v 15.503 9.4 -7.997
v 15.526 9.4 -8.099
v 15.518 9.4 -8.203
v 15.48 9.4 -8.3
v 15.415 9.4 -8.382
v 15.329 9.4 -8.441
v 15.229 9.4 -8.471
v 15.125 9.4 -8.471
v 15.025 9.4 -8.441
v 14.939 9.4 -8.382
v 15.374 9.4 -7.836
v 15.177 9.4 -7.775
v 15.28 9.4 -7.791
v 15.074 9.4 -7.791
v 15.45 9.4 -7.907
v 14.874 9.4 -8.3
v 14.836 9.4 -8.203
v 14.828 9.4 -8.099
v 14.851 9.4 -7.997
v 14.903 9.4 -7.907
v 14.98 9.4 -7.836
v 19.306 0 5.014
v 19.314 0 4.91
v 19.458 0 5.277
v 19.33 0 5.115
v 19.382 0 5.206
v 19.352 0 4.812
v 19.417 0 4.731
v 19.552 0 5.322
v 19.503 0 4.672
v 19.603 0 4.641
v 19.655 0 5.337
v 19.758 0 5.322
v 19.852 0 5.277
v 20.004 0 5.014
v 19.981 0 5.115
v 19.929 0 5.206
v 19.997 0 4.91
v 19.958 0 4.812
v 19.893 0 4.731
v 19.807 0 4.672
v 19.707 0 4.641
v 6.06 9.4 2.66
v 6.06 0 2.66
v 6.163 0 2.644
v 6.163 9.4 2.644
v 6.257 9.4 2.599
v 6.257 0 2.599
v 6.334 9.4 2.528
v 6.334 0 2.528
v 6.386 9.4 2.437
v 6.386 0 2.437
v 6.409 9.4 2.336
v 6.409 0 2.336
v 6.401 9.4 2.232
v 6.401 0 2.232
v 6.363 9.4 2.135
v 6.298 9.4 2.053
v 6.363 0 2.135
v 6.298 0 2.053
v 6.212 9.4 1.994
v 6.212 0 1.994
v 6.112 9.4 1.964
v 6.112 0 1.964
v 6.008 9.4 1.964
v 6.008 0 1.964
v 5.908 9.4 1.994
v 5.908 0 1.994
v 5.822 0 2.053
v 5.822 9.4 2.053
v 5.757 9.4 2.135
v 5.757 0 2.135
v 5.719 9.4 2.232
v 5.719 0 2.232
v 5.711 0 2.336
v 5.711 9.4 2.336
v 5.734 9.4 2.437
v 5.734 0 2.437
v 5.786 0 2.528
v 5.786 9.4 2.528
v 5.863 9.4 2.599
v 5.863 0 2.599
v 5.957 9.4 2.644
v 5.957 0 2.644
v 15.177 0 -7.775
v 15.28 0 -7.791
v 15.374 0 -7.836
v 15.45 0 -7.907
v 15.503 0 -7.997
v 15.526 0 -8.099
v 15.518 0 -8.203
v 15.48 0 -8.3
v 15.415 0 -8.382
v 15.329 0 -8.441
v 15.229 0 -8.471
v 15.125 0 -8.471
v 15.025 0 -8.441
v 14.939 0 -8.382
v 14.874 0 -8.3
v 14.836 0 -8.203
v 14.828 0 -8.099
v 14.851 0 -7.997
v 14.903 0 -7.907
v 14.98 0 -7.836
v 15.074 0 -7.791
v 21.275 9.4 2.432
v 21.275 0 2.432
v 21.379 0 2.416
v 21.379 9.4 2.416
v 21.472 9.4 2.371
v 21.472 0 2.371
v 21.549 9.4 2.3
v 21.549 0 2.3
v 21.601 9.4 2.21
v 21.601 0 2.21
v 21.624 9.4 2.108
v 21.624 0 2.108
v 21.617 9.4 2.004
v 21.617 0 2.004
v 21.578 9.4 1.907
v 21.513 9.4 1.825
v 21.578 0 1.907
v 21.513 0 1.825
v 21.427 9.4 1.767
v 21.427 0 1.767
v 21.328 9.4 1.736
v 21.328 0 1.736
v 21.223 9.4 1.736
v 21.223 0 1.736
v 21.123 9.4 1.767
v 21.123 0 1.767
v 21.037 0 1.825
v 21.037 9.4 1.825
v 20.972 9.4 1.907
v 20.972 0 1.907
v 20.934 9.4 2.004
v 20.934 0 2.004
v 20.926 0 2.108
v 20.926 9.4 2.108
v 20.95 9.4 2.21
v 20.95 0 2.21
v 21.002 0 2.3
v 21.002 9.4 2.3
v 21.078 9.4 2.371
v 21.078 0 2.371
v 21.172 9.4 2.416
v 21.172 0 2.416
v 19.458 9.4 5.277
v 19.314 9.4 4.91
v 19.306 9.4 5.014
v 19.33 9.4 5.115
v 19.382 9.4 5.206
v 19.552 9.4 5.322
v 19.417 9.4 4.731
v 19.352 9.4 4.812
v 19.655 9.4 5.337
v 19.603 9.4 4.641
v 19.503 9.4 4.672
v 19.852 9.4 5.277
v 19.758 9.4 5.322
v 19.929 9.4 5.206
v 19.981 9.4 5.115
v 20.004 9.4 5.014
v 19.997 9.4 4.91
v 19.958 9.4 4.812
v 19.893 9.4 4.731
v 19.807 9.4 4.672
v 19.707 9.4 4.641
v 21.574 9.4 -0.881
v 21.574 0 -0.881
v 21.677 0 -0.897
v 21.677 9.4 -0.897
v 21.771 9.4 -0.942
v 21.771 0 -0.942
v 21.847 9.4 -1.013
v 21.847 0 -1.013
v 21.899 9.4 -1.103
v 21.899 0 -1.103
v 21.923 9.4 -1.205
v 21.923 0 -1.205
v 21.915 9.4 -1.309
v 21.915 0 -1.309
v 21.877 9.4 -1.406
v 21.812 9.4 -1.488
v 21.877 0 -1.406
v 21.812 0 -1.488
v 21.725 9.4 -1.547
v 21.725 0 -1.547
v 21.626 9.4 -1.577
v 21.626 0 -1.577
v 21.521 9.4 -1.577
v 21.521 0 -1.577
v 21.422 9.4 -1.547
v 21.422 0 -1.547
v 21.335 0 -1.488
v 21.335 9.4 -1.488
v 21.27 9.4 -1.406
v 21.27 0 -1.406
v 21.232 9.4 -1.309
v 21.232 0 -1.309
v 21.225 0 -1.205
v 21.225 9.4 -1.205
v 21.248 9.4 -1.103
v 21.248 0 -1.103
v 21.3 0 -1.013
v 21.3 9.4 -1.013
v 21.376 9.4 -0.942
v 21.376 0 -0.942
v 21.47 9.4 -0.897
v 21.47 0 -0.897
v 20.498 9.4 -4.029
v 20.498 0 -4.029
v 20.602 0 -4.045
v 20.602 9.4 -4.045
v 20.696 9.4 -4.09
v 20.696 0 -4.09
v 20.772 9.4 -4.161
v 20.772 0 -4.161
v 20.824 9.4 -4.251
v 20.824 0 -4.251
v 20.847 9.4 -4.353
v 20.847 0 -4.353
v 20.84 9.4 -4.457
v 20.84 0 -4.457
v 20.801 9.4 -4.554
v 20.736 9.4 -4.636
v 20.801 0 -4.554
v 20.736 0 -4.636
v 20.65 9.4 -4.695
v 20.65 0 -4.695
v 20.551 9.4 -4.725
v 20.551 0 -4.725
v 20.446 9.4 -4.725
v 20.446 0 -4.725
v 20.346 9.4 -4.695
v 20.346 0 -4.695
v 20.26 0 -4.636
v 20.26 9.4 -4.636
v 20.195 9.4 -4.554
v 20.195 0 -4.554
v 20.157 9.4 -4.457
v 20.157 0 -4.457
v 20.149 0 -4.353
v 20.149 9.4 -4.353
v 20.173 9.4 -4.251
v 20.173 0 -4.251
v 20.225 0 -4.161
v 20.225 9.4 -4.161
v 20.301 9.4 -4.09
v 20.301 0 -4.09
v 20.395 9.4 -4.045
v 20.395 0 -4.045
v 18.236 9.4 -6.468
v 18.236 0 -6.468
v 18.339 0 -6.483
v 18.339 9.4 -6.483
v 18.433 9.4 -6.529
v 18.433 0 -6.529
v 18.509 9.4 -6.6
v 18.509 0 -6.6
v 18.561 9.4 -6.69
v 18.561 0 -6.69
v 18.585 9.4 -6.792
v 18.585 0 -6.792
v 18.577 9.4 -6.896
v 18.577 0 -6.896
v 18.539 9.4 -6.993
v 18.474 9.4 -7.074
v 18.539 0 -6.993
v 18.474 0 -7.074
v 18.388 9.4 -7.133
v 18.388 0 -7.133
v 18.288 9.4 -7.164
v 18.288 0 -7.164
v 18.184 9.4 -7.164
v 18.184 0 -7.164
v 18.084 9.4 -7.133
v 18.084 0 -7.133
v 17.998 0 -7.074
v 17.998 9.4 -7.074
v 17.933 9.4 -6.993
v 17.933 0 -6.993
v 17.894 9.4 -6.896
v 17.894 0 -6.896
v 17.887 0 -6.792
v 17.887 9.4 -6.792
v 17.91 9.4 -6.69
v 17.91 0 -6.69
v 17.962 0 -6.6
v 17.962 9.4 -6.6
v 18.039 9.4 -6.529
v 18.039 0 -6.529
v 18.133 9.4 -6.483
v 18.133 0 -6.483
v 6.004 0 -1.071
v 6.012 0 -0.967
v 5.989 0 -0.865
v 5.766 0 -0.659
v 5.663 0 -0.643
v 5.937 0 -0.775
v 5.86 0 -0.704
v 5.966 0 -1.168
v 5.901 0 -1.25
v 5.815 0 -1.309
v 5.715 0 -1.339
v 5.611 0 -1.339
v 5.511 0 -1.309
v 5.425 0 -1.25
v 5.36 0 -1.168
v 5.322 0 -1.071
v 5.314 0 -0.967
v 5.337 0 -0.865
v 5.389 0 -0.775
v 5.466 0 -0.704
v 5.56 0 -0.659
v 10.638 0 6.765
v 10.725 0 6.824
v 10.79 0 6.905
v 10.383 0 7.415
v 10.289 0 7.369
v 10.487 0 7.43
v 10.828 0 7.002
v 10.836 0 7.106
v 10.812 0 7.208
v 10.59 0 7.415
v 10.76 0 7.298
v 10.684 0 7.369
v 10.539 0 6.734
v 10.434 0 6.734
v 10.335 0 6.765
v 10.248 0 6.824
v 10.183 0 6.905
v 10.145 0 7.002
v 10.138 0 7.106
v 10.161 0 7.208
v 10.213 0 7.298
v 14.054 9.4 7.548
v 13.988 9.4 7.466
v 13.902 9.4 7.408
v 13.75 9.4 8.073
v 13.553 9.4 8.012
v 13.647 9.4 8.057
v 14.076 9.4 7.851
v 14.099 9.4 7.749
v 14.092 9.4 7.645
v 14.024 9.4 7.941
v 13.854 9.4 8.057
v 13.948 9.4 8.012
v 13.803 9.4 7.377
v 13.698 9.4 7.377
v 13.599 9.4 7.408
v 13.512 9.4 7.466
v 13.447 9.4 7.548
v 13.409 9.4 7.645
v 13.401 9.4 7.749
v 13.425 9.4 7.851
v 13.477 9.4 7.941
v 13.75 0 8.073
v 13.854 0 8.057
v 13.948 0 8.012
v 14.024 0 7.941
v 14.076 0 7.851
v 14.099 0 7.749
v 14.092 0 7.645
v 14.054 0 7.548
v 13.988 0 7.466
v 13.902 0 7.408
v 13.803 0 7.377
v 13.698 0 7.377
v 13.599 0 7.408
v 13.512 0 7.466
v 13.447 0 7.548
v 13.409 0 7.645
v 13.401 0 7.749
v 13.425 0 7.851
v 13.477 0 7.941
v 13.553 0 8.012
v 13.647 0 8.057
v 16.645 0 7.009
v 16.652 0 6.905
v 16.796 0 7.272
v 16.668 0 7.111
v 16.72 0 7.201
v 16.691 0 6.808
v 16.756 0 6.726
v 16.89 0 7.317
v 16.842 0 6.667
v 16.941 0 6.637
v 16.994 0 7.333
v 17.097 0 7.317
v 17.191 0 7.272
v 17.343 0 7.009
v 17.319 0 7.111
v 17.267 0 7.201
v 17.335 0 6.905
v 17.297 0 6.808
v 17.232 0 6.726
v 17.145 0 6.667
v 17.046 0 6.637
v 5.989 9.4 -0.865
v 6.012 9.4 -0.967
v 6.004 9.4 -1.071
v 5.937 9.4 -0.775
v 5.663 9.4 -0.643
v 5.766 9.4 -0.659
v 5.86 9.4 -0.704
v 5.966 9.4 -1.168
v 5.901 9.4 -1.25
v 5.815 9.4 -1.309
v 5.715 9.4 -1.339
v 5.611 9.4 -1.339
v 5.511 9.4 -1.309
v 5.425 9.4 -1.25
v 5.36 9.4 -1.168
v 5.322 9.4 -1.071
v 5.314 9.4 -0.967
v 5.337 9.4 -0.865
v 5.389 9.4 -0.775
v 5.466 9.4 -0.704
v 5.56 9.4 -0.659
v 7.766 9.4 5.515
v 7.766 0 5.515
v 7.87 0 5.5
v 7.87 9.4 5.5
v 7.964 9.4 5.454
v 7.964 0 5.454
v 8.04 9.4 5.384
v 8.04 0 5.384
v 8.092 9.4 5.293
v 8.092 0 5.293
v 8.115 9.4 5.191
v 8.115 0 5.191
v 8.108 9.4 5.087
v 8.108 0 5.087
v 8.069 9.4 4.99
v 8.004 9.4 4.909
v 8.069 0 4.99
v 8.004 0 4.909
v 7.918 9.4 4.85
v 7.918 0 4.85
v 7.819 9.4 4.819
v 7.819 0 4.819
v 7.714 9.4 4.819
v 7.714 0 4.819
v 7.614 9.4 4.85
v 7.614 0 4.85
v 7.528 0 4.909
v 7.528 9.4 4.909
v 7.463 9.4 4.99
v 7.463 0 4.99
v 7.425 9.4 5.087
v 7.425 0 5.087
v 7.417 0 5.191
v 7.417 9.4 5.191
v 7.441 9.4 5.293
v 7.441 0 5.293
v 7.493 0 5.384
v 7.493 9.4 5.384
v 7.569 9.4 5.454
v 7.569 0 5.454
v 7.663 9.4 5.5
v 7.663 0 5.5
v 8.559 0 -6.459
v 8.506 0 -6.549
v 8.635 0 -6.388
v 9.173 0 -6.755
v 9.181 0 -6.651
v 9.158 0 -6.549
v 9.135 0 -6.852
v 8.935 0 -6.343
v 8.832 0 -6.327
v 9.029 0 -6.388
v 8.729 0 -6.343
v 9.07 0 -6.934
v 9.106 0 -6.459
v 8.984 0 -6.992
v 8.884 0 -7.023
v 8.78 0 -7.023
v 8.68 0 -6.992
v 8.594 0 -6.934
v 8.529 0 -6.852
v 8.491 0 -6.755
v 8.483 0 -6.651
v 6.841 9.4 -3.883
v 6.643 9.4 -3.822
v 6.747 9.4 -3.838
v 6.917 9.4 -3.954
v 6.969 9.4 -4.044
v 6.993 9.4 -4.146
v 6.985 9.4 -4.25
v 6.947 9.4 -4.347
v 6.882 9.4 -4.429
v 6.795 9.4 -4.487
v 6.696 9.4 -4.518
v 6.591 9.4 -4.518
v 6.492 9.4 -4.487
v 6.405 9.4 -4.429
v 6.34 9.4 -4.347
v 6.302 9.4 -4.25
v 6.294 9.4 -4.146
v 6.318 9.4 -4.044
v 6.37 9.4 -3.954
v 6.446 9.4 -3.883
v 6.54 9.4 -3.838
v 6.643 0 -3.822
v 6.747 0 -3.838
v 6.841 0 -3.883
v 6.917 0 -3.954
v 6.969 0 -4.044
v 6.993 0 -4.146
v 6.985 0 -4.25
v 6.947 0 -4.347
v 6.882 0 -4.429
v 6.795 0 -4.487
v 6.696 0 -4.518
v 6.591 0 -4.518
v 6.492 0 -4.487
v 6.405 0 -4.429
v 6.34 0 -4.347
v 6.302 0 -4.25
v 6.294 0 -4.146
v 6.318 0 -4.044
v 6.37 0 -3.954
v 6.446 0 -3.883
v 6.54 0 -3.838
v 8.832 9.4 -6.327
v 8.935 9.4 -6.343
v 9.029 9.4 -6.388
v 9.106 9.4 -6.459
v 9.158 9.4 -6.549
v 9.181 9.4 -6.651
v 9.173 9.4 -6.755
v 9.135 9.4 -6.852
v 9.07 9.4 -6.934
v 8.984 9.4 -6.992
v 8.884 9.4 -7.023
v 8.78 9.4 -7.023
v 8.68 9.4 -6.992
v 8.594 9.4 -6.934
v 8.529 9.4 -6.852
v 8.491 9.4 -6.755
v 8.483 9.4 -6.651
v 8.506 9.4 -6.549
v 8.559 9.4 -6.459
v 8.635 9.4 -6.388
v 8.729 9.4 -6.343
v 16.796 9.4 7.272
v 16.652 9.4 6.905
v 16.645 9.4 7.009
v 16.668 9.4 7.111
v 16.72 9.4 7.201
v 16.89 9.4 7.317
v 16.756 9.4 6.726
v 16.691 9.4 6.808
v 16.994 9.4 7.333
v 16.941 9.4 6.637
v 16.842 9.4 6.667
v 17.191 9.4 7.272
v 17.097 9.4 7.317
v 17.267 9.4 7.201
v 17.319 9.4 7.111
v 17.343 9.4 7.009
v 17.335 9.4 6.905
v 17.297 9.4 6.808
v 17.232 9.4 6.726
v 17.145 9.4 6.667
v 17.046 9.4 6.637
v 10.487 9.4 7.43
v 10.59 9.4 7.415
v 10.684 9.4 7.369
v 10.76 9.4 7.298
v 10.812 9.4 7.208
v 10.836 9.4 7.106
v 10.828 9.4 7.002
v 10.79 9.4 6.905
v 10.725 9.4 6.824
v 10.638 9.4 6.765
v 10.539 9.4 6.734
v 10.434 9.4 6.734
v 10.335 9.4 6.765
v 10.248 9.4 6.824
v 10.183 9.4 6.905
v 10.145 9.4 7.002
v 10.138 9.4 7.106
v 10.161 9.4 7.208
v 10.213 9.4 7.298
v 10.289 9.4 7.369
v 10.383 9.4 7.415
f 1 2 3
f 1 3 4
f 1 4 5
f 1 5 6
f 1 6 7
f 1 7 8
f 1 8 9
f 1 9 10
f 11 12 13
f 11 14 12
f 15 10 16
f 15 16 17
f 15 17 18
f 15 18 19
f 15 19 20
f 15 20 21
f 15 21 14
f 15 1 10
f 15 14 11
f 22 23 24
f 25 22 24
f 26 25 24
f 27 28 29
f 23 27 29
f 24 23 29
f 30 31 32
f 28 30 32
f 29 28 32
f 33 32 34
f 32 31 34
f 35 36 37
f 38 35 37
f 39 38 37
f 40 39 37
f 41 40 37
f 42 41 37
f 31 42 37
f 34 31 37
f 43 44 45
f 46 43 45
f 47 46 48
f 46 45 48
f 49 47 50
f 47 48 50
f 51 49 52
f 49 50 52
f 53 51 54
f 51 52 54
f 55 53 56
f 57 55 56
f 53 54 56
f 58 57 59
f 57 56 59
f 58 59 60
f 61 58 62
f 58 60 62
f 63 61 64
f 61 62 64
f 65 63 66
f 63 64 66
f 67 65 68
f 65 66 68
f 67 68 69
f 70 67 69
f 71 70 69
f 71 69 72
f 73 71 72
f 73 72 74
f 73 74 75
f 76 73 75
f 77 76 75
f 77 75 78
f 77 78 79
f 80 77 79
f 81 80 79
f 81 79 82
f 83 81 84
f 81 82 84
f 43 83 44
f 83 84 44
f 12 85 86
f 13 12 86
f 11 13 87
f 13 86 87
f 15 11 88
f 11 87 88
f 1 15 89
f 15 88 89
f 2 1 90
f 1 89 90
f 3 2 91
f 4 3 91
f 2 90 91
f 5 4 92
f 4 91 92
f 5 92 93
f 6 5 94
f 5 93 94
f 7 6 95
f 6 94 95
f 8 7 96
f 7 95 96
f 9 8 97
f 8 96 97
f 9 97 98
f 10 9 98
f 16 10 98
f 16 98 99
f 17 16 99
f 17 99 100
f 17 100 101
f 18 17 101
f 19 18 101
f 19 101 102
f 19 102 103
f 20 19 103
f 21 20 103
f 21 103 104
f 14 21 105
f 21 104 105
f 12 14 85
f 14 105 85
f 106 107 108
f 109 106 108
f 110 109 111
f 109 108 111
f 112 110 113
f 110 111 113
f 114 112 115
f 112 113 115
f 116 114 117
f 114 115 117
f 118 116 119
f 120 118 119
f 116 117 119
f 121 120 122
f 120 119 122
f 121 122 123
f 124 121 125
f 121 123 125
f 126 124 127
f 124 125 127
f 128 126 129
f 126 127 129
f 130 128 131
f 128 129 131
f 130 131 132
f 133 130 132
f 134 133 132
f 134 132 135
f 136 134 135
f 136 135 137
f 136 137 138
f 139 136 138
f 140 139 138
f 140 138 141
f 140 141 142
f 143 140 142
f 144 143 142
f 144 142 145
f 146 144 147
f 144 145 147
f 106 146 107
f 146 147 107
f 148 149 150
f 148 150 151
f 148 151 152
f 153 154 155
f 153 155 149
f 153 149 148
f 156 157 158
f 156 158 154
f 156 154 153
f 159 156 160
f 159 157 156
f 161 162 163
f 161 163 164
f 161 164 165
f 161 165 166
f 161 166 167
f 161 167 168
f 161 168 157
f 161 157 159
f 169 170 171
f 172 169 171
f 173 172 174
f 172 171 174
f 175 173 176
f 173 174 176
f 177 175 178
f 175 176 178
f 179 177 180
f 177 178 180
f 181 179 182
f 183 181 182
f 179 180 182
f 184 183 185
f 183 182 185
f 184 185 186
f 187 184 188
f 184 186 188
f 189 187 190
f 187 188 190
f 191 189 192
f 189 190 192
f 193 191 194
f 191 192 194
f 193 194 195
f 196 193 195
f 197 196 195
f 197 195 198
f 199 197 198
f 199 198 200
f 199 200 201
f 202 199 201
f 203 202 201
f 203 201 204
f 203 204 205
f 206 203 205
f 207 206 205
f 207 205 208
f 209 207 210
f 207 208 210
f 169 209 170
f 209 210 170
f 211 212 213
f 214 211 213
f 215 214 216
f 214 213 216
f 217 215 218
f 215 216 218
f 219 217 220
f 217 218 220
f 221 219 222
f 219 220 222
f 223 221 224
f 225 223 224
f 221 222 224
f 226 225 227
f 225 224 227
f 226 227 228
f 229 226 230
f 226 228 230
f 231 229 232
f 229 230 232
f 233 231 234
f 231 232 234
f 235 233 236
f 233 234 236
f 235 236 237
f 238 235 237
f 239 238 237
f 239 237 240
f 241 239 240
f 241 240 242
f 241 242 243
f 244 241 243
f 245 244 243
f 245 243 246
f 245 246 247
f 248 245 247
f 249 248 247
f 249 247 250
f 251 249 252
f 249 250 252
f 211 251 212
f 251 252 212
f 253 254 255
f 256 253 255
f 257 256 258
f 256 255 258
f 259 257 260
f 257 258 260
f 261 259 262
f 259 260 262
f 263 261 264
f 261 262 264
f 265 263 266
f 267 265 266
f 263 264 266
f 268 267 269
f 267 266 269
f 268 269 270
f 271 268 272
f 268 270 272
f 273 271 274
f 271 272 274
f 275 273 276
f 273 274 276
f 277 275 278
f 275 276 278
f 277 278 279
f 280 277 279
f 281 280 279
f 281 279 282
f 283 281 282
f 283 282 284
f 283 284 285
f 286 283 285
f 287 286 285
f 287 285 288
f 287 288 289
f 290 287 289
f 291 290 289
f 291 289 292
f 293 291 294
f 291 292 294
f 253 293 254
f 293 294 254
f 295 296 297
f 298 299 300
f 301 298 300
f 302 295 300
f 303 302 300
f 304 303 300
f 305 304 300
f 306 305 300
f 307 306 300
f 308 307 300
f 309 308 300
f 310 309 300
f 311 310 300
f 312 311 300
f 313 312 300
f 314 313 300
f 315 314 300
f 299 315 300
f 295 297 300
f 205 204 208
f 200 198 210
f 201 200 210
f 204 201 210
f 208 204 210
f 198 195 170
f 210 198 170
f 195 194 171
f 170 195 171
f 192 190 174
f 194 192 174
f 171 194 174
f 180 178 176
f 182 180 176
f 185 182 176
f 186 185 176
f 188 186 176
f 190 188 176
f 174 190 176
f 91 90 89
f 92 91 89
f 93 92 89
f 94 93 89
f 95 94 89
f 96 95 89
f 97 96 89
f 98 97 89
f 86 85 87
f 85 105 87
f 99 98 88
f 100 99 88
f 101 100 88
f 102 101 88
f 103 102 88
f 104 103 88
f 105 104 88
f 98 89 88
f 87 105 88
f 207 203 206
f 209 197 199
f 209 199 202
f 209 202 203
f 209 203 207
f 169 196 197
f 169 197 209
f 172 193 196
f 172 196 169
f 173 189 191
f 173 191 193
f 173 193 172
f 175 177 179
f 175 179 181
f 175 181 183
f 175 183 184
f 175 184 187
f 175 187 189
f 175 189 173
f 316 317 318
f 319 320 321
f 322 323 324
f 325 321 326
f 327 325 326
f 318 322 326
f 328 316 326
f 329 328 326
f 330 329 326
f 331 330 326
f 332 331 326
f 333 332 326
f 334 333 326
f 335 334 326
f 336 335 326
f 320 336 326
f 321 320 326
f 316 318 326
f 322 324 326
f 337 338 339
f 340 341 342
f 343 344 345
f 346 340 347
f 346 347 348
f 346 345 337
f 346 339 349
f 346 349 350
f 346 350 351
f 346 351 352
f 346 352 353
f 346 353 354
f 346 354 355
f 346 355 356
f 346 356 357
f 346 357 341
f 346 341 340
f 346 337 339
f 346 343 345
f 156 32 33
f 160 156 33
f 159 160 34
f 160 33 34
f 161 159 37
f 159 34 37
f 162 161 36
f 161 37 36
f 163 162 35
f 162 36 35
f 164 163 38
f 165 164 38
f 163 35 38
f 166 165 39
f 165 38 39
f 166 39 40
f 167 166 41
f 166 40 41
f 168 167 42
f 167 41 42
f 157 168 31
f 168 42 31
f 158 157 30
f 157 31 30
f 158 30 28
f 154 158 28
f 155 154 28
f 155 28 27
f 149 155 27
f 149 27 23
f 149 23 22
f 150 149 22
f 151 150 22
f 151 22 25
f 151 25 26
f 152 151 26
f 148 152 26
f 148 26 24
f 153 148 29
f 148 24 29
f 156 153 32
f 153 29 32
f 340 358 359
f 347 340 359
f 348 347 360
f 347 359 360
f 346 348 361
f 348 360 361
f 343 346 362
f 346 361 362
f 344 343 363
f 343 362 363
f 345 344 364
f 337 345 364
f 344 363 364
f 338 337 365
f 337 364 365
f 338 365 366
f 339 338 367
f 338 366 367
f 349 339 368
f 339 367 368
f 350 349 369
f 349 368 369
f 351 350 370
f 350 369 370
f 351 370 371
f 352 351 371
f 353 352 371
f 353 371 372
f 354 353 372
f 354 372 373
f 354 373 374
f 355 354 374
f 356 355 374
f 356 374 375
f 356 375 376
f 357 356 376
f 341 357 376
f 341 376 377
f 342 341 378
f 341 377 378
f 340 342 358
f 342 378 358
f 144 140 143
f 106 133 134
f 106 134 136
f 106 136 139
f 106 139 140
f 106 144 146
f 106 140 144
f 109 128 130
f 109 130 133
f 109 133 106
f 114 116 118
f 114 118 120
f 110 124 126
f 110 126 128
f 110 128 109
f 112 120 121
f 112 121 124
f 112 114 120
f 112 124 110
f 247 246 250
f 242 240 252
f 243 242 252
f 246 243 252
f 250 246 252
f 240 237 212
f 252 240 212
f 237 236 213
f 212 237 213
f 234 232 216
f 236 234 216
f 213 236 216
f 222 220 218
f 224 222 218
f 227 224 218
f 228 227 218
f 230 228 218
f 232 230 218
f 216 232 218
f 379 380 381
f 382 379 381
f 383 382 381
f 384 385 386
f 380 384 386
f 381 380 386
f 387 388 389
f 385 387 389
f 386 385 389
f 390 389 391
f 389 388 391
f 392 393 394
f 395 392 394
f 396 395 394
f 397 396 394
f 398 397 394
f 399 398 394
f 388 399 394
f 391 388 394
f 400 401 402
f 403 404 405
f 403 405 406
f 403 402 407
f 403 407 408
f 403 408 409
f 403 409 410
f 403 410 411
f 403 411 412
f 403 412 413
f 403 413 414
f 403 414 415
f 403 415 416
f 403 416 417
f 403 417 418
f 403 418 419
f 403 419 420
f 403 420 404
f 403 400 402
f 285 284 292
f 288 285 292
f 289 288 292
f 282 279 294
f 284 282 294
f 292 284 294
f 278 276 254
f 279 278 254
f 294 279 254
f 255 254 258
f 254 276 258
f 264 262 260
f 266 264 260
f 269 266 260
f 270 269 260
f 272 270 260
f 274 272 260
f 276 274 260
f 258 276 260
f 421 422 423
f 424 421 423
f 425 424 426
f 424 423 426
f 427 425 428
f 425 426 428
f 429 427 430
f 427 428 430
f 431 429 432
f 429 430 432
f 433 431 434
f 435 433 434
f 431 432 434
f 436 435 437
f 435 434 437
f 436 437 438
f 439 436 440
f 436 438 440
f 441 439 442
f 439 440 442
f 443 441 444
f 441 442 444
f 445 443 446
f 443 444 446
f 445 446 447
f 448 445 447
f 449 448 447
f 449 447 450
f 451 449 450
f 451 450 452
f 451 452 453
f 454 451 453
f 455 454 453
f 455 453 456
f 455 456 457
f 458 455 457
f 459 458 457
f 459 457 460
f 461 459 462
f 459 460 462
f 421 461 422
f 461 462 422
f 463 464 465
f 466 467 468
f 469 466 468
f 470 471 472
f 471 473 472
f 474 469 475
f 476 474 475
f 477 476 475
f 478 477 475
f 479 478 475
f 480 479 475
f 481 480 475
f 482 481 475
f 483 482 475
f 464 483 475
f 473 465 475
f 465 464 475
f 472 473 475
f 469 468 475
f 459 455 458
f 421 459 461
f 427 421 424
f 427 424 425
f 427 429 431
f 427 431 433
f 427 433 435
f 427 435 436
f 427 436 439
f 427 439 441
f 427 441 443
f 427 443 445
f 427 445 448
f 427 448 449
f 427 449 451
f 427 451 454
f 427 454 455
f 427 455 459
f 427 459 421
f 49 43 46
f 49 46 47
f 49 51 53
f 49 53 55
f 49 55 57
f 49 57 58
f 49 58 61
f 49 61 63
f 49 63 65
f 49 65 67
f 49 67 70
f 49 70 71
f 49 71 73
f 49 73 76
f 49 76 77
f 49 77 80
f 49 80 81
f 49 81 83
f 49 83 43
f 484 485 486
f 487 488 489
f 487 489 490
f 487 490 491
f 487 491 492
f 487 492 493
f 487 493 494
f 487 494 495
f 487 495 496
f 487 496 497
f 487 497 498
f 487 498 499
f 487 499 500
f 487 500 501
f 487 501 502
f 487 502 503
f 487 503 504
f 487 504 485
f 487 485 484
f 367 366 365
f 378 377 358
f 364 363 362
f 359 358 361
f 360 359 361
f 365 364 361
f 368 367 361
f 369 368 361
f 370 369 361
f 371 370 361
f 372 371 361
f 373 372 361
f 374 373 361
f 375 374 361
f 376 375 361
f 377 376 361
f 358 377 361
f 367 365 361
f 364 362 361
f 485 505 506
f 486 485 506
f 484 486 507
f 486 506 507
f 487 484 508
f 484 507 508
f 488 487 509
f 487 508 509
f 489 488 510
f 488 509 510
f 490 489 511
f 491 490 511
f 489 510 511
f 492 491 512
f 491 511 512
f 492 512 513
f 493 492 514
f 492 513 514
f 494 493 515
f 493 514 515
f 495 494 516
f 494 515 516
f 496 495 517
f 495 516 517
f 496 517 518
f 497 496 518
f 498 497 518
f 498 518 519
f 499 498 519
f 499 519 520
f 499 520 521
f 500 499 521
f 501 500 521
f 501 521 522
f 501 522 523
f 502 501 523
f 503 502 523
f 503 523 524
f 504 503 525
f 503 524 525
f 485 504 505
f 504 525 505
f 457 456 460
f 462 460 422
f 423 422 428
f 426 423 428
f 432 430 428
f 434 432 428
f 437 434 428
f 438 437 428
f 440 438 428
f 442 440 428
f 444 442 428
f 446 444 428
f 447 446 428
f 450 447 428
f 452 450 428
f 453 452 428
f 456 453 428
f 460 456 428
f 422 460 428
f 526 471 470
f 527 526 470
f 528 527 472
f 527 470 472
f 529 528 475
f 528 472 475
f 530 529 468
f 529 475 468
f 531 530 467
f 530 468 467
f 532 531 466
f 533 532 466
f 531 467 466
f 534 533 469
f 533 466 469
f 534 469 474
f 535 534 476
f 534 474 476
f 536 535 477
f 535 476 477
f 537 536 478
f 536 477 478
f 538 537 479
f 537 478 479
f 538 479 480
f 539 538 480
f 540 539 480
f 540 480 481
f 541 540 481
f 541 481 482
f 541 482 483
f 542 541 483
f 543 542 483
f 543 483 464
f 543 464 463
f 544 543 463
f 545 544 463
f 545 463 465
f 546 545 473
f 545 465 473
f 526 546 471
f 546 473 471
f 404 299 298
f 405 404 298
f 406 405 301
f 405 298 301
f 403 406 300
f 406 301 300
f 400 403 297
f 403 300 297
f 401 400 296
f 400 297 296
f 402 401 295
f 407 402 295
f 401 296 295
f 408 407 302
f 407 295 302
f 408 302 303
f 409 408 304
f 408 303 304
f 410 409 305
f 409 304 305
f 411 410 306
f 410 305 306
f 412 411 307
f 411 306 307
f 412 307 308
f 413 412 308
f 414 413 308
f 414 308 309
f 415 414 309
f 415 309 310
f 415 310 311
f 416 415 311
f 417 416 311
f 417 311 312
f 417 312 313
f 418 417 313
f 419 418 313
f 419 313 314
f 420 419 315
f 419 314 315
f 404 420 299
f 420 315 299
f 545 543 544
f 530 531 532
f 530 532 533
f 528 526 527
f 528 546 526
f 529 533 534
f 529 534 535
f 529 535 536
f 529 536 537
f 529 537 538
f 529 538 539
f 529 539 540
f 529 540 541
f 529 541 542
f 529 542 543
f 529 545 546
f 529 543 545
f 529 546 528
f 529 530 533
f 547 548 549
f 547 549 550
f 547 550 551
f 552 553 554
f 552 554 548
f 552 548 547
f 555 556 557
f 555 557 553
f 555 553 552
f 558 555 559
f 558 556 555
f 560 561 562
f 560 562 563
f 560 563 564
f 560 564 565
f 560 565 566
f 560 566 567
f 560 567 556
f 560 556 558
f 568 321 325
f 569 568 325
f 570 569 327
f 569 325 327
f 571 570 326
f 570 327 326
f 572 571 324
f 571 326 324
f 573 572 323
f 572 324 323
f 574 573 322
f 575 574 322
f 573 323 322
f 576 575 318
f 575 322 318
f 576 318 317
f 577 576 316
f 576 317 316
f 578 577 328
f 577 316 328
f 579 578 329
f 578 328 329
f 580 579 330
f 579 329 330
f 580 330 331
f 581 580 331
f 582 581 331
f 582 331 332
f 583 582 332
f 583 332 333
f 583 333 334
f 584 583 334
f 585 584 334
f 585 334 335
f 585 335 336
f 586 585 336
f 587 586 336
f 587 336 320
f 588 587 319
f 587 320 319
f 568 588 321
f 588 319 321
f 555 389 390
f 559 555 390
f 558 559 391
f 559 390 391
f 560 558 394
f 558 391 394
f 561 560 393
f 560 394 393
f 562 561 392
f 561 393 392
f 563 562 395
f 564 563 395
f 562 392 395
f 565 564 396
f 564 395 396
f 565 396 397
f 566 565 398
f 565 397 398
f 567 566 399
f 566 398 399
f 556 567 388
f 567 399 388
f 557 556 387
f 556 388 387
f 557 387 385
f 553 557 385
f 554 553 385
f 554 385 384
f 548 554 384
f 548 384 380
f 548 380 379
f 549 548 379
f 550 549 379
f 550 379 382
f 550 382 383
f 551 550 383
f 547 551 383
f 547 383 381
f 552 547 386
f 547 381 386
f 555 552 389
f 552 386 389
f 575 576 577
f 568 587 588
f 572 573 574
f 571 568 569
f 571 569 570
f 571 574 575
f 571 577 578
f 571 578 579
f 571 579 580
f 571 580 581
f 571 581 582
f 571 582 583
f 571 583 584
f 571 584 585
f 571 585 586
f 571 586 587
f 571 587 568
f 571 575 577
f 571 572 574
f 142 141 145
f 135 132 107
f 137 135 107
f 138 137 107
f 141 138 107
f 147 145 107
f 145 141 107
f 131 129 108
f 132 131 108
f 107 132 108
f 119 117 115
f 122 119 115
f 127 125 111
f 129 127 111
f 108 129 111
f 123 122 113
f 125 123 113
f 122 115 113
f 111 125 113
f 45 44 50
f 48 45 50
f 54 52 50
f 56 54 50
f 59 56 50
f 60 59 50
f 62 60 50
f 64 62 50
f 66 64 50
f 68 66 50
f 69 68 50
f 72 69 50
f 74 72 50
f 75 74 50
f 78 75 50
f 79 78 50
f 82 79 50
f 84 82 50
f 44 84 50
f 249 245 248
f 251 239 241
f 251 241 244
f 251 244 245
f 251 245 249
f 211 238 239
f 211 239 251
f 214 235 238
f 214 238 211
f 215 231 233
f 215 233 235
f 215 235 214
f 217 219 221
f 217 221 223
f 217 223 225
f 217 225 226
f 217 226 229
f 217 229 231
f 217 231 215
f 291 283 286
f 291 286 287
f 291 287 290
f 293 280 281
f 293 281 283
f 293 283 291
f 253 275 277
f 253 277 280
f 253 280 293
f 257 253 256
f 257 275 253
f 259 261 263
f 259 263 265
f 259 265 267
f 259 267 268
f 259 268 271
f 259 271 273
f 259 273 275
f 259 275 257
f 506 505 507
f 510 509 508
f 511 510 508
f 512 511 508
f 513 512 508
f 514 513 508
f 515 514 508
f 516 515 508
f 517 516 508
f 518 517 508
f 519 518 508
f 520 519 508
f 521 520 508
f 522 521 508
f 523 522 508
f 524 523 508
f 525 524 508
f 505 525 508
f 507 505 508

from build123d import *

# Parameters (mm, degrees)
SKETCH1_R              = 0.35
BOSS_EXTRUDE1_DEPTH    = 9.4
BOSS_EXTRUDE1_2_DEPTH  = 9.4
BOSS_EXTRUDE1_3_DEPTH  = 9.4
BOSS_EXTRUDE1_4_DEPTH  = 9.4
BOSS_EXTRUDE1_5_DEPTH  = 9.4
BOSS_EXTRUDE1_6_DEPTH  = 9.4
BOSS_EXTRUDE1_7_DEPTH  = 9.4
BOSS_EXTRUDE1_8_DEPTH  = 9.4
BOSS_EXTRUDE1_9_DEPTH  = 9.4
BOSS_EXTRUDE1_10_DEPTH = 9.4
BOSS_EXTRUDE1_11_DEPTH = 9.4
BOSS_EXTRUDE1_12_DEPTH = 9.4
BOSS_EXTRUDE1_13_DEPTH = 9.4
BOSS_EXTRUDE1_14_DEPTH = 9.4


with BuildPart() as part:
    # Sketch1 → Boss-Extrude1 (new body)
    with BuildSketch(Plane(origin=(0, 0, 0), x_dir=(1, 0, 0), z_dir=(0, 1, 0))):
        with Locations(Location((15.176802475, 8.12525881, 0), (0, 0, 270))):
            Circle(SKETCH1_R)
    extrude(amount=BOSS_EXTRUDE1_DEPTH)


with BuildPart() as body_2:
    # Sketch1 → Boss-Extrude1 2 (new body)
    with BuildSketch(Plane(origin=(0, 0, 0), x_dir=(1, 0, 0), z_dir=(0, 1, 0))):
        with Locations(Location((18.235691658, 6.817826829, 0), (0, 0, 270))):
            Circle(SKETCH1_R)
    extrude(amount=BOSS_EXTRUDE1_2_DEPTH)


with BuildPart() as body_3:
    # Sketch1 → Boss-Extrude1 3 (new body)
    with BuildSketch(Plane(origin=(0, 0, 0), x_dir=(1, 0, 0), z_dir=(0, 1, 0))):
        with Locations(Location((20.498345482, 4.379265963, 0), (0, 0, 270))):
            Circle(SKETCH1_R)
    extrude(amount=BOSS_EXTRUDE1_3_DEPTH)


with BuildPart() as body_4:
    # Sketch1 → Boss-Extrude1 4 (new body)
    with BuildSketch(Plane(origin=(0, 0, 0), x_dir=(1, 0, 0), z_dir=(0, 1, 0))):
        with Locations(Location((21.573530543, 1.23122554, 0), (0, 0, 270))):
            Circle(SKETCH1_R)
    extrude(amount=BOSS_EXTRUDE1_4_DEPTH)


with BuildPart() as body_5:
    # Sketch1 → Boss-Extrude1 5 (new body)
    with BuildSketch(Plane(origin=(0, 0, 0), x_dir=(1, 0, 0), z_dir=(0, 1, 0))):
        with Locations(Location((21.275337579, -2.081969652, 0), (0, 0, 270))):
            Circle(SKETCH1_R)
    extrude(amount=BOSS_EXTRUDE1_5_DEPTH)


with BuildPart() as body_6:
    # Sketch1 → Boss-Extrude1 6 (new body)
    with BuildSketch(Plane(origin=(0, 0, 0), x_dir=(1, 0, 0), z_dir=(0, 1, 0))):
        with Locations(Location((19.655326861, -4.987438064, 0), (0, 0, 270))):
            Circle(SKETCH1_R)
    extrude(amount=BOSS_EXTRUDE1_6_DEPTH)


with BuildPart() as body_7:
    # Sketch1 → Boss-Extrude1 7 (new body)
    with BuildSketch(Plane(origin=(0, 0, 0), x_dir=(1, 0, 0), z_dir=(0, 1, 0))):
        with Locations(Location((16.993612959, -6.982797813, 0), (0, 0, 270))):
            Circle(SKETCH1_R)
    extrude(amount=BOSS_EXTRUDE1_7_DEPTH)


with BuildPart() as body_8:
    # Sketch1 → Boss-Extrude1 8 (new body)
    with BuildSketch(Plane(origin=(0, 0, 0), x_dir=(1, 0, 0), z_dir=(0, 1, 0))):
        with Locations(Location((13.750430389, -7.723033071, 0), (0, 0, 270))):
            Circle(SKETCH1_R)
    extrude(amount=BOSS_EXTRUDE1_8_DEPTH)


with BuildPart() as body_9:
    # Sketch1 → Boss-Extrude1 9 (new body)
    with BuildSketch(Plane(origin=(0, 0, 0), x_dir=(1, 0, 0), z_dir=(0, 1, 0))):
        with Locations(Location((10.48655488, -7.080150437, 0), (0, 0, 270))):
            Circle(SKETCH1_R)
    extrude(amount=BOSS_EXTRUDE1_9_DEPTH)


with BuildPart() as body_10:
    # Sketch1 → Boss-Extrude1 10 (new body)
    with BuildSketch(Plane(origin=(0, 0, 0), x_dir=(1, 0, 0), z_dir=(0, 1, 0))):
        with Locations(Location((7.766340158, -5.165310159, 0), (0, 0, 270))):
            Circle(SKETCH1_R)
    extrude(amount=BOSS_EXTRUDE1_10_DEPTH)


with BuildPart() as body_11:
    # Sketch1 → Boss-Extrude1 11 (new body)
    with BuildSketch(Plane(origin=(0, 0, 0), x_dir=(1, 0, 0), z_dir=(0, 1, 0))):
        with Locations(Location((6.060136062, -2.309605516, 0), (0, 0, 270))):
            Circle(SKETCH1_R)
    extrude(amount=BOSS_EXTRUDE1_11_DEPTH)


with BuildPart() as body_12:
    # Sketch1 → Boss-Extrude1 12 (new body)
    with BuildSketch(Plane(origin=(0, 0, 0), x_dir=(1, 0, 0), z_dir=(0, 1, 0))):
        with Locations(Location((5.662960781, 0.993186215, 0), (0, 0, 270))):
            Circle(SKETCH1_R)
    extrude(amount=BOSS_EXTRUDE1_12_DEPTH)


with BuildPart() as body_13:
    # Sketch1 → Boss-Extrude1 13 (new body)
    with BuildSketch(Plane(origin=(0, 0, 0), x_dir=(1, 0, 0), z_dir=(0, 1, 0))):
        with Locations(Location((6.643489528, 4.171982339, 0), (0, 0, 270))):
            Circle(SKETCH1_R)
    extrude(amount=BOSS_EXTRUDE1_13_DEPTH)


with BuildPart() as body_14:
    # Sketch1 → Boss-Extrude1 14 (new body)
    with BuildSketch(Plane(origin=(0, 0, 0), x_dir=(1, 0, 0), z_dir=(0, 1, 0))):
        with Locations(Location((8.832179975, 6.677140127, 0), (0, 0, 270))):
            Circle(SKETCH1_R)
    extrude(amount=BOSS_EXTRUDE1_14_DEPTH)


solid = Compound([part.part, body_2.part, body_3.part, body_4.part, body_5.part, body_6.part, body_7.part, body_8.part, body_9.part, body_10.part, body_11.part, body_12.part, body_13.part, body_14.part])
